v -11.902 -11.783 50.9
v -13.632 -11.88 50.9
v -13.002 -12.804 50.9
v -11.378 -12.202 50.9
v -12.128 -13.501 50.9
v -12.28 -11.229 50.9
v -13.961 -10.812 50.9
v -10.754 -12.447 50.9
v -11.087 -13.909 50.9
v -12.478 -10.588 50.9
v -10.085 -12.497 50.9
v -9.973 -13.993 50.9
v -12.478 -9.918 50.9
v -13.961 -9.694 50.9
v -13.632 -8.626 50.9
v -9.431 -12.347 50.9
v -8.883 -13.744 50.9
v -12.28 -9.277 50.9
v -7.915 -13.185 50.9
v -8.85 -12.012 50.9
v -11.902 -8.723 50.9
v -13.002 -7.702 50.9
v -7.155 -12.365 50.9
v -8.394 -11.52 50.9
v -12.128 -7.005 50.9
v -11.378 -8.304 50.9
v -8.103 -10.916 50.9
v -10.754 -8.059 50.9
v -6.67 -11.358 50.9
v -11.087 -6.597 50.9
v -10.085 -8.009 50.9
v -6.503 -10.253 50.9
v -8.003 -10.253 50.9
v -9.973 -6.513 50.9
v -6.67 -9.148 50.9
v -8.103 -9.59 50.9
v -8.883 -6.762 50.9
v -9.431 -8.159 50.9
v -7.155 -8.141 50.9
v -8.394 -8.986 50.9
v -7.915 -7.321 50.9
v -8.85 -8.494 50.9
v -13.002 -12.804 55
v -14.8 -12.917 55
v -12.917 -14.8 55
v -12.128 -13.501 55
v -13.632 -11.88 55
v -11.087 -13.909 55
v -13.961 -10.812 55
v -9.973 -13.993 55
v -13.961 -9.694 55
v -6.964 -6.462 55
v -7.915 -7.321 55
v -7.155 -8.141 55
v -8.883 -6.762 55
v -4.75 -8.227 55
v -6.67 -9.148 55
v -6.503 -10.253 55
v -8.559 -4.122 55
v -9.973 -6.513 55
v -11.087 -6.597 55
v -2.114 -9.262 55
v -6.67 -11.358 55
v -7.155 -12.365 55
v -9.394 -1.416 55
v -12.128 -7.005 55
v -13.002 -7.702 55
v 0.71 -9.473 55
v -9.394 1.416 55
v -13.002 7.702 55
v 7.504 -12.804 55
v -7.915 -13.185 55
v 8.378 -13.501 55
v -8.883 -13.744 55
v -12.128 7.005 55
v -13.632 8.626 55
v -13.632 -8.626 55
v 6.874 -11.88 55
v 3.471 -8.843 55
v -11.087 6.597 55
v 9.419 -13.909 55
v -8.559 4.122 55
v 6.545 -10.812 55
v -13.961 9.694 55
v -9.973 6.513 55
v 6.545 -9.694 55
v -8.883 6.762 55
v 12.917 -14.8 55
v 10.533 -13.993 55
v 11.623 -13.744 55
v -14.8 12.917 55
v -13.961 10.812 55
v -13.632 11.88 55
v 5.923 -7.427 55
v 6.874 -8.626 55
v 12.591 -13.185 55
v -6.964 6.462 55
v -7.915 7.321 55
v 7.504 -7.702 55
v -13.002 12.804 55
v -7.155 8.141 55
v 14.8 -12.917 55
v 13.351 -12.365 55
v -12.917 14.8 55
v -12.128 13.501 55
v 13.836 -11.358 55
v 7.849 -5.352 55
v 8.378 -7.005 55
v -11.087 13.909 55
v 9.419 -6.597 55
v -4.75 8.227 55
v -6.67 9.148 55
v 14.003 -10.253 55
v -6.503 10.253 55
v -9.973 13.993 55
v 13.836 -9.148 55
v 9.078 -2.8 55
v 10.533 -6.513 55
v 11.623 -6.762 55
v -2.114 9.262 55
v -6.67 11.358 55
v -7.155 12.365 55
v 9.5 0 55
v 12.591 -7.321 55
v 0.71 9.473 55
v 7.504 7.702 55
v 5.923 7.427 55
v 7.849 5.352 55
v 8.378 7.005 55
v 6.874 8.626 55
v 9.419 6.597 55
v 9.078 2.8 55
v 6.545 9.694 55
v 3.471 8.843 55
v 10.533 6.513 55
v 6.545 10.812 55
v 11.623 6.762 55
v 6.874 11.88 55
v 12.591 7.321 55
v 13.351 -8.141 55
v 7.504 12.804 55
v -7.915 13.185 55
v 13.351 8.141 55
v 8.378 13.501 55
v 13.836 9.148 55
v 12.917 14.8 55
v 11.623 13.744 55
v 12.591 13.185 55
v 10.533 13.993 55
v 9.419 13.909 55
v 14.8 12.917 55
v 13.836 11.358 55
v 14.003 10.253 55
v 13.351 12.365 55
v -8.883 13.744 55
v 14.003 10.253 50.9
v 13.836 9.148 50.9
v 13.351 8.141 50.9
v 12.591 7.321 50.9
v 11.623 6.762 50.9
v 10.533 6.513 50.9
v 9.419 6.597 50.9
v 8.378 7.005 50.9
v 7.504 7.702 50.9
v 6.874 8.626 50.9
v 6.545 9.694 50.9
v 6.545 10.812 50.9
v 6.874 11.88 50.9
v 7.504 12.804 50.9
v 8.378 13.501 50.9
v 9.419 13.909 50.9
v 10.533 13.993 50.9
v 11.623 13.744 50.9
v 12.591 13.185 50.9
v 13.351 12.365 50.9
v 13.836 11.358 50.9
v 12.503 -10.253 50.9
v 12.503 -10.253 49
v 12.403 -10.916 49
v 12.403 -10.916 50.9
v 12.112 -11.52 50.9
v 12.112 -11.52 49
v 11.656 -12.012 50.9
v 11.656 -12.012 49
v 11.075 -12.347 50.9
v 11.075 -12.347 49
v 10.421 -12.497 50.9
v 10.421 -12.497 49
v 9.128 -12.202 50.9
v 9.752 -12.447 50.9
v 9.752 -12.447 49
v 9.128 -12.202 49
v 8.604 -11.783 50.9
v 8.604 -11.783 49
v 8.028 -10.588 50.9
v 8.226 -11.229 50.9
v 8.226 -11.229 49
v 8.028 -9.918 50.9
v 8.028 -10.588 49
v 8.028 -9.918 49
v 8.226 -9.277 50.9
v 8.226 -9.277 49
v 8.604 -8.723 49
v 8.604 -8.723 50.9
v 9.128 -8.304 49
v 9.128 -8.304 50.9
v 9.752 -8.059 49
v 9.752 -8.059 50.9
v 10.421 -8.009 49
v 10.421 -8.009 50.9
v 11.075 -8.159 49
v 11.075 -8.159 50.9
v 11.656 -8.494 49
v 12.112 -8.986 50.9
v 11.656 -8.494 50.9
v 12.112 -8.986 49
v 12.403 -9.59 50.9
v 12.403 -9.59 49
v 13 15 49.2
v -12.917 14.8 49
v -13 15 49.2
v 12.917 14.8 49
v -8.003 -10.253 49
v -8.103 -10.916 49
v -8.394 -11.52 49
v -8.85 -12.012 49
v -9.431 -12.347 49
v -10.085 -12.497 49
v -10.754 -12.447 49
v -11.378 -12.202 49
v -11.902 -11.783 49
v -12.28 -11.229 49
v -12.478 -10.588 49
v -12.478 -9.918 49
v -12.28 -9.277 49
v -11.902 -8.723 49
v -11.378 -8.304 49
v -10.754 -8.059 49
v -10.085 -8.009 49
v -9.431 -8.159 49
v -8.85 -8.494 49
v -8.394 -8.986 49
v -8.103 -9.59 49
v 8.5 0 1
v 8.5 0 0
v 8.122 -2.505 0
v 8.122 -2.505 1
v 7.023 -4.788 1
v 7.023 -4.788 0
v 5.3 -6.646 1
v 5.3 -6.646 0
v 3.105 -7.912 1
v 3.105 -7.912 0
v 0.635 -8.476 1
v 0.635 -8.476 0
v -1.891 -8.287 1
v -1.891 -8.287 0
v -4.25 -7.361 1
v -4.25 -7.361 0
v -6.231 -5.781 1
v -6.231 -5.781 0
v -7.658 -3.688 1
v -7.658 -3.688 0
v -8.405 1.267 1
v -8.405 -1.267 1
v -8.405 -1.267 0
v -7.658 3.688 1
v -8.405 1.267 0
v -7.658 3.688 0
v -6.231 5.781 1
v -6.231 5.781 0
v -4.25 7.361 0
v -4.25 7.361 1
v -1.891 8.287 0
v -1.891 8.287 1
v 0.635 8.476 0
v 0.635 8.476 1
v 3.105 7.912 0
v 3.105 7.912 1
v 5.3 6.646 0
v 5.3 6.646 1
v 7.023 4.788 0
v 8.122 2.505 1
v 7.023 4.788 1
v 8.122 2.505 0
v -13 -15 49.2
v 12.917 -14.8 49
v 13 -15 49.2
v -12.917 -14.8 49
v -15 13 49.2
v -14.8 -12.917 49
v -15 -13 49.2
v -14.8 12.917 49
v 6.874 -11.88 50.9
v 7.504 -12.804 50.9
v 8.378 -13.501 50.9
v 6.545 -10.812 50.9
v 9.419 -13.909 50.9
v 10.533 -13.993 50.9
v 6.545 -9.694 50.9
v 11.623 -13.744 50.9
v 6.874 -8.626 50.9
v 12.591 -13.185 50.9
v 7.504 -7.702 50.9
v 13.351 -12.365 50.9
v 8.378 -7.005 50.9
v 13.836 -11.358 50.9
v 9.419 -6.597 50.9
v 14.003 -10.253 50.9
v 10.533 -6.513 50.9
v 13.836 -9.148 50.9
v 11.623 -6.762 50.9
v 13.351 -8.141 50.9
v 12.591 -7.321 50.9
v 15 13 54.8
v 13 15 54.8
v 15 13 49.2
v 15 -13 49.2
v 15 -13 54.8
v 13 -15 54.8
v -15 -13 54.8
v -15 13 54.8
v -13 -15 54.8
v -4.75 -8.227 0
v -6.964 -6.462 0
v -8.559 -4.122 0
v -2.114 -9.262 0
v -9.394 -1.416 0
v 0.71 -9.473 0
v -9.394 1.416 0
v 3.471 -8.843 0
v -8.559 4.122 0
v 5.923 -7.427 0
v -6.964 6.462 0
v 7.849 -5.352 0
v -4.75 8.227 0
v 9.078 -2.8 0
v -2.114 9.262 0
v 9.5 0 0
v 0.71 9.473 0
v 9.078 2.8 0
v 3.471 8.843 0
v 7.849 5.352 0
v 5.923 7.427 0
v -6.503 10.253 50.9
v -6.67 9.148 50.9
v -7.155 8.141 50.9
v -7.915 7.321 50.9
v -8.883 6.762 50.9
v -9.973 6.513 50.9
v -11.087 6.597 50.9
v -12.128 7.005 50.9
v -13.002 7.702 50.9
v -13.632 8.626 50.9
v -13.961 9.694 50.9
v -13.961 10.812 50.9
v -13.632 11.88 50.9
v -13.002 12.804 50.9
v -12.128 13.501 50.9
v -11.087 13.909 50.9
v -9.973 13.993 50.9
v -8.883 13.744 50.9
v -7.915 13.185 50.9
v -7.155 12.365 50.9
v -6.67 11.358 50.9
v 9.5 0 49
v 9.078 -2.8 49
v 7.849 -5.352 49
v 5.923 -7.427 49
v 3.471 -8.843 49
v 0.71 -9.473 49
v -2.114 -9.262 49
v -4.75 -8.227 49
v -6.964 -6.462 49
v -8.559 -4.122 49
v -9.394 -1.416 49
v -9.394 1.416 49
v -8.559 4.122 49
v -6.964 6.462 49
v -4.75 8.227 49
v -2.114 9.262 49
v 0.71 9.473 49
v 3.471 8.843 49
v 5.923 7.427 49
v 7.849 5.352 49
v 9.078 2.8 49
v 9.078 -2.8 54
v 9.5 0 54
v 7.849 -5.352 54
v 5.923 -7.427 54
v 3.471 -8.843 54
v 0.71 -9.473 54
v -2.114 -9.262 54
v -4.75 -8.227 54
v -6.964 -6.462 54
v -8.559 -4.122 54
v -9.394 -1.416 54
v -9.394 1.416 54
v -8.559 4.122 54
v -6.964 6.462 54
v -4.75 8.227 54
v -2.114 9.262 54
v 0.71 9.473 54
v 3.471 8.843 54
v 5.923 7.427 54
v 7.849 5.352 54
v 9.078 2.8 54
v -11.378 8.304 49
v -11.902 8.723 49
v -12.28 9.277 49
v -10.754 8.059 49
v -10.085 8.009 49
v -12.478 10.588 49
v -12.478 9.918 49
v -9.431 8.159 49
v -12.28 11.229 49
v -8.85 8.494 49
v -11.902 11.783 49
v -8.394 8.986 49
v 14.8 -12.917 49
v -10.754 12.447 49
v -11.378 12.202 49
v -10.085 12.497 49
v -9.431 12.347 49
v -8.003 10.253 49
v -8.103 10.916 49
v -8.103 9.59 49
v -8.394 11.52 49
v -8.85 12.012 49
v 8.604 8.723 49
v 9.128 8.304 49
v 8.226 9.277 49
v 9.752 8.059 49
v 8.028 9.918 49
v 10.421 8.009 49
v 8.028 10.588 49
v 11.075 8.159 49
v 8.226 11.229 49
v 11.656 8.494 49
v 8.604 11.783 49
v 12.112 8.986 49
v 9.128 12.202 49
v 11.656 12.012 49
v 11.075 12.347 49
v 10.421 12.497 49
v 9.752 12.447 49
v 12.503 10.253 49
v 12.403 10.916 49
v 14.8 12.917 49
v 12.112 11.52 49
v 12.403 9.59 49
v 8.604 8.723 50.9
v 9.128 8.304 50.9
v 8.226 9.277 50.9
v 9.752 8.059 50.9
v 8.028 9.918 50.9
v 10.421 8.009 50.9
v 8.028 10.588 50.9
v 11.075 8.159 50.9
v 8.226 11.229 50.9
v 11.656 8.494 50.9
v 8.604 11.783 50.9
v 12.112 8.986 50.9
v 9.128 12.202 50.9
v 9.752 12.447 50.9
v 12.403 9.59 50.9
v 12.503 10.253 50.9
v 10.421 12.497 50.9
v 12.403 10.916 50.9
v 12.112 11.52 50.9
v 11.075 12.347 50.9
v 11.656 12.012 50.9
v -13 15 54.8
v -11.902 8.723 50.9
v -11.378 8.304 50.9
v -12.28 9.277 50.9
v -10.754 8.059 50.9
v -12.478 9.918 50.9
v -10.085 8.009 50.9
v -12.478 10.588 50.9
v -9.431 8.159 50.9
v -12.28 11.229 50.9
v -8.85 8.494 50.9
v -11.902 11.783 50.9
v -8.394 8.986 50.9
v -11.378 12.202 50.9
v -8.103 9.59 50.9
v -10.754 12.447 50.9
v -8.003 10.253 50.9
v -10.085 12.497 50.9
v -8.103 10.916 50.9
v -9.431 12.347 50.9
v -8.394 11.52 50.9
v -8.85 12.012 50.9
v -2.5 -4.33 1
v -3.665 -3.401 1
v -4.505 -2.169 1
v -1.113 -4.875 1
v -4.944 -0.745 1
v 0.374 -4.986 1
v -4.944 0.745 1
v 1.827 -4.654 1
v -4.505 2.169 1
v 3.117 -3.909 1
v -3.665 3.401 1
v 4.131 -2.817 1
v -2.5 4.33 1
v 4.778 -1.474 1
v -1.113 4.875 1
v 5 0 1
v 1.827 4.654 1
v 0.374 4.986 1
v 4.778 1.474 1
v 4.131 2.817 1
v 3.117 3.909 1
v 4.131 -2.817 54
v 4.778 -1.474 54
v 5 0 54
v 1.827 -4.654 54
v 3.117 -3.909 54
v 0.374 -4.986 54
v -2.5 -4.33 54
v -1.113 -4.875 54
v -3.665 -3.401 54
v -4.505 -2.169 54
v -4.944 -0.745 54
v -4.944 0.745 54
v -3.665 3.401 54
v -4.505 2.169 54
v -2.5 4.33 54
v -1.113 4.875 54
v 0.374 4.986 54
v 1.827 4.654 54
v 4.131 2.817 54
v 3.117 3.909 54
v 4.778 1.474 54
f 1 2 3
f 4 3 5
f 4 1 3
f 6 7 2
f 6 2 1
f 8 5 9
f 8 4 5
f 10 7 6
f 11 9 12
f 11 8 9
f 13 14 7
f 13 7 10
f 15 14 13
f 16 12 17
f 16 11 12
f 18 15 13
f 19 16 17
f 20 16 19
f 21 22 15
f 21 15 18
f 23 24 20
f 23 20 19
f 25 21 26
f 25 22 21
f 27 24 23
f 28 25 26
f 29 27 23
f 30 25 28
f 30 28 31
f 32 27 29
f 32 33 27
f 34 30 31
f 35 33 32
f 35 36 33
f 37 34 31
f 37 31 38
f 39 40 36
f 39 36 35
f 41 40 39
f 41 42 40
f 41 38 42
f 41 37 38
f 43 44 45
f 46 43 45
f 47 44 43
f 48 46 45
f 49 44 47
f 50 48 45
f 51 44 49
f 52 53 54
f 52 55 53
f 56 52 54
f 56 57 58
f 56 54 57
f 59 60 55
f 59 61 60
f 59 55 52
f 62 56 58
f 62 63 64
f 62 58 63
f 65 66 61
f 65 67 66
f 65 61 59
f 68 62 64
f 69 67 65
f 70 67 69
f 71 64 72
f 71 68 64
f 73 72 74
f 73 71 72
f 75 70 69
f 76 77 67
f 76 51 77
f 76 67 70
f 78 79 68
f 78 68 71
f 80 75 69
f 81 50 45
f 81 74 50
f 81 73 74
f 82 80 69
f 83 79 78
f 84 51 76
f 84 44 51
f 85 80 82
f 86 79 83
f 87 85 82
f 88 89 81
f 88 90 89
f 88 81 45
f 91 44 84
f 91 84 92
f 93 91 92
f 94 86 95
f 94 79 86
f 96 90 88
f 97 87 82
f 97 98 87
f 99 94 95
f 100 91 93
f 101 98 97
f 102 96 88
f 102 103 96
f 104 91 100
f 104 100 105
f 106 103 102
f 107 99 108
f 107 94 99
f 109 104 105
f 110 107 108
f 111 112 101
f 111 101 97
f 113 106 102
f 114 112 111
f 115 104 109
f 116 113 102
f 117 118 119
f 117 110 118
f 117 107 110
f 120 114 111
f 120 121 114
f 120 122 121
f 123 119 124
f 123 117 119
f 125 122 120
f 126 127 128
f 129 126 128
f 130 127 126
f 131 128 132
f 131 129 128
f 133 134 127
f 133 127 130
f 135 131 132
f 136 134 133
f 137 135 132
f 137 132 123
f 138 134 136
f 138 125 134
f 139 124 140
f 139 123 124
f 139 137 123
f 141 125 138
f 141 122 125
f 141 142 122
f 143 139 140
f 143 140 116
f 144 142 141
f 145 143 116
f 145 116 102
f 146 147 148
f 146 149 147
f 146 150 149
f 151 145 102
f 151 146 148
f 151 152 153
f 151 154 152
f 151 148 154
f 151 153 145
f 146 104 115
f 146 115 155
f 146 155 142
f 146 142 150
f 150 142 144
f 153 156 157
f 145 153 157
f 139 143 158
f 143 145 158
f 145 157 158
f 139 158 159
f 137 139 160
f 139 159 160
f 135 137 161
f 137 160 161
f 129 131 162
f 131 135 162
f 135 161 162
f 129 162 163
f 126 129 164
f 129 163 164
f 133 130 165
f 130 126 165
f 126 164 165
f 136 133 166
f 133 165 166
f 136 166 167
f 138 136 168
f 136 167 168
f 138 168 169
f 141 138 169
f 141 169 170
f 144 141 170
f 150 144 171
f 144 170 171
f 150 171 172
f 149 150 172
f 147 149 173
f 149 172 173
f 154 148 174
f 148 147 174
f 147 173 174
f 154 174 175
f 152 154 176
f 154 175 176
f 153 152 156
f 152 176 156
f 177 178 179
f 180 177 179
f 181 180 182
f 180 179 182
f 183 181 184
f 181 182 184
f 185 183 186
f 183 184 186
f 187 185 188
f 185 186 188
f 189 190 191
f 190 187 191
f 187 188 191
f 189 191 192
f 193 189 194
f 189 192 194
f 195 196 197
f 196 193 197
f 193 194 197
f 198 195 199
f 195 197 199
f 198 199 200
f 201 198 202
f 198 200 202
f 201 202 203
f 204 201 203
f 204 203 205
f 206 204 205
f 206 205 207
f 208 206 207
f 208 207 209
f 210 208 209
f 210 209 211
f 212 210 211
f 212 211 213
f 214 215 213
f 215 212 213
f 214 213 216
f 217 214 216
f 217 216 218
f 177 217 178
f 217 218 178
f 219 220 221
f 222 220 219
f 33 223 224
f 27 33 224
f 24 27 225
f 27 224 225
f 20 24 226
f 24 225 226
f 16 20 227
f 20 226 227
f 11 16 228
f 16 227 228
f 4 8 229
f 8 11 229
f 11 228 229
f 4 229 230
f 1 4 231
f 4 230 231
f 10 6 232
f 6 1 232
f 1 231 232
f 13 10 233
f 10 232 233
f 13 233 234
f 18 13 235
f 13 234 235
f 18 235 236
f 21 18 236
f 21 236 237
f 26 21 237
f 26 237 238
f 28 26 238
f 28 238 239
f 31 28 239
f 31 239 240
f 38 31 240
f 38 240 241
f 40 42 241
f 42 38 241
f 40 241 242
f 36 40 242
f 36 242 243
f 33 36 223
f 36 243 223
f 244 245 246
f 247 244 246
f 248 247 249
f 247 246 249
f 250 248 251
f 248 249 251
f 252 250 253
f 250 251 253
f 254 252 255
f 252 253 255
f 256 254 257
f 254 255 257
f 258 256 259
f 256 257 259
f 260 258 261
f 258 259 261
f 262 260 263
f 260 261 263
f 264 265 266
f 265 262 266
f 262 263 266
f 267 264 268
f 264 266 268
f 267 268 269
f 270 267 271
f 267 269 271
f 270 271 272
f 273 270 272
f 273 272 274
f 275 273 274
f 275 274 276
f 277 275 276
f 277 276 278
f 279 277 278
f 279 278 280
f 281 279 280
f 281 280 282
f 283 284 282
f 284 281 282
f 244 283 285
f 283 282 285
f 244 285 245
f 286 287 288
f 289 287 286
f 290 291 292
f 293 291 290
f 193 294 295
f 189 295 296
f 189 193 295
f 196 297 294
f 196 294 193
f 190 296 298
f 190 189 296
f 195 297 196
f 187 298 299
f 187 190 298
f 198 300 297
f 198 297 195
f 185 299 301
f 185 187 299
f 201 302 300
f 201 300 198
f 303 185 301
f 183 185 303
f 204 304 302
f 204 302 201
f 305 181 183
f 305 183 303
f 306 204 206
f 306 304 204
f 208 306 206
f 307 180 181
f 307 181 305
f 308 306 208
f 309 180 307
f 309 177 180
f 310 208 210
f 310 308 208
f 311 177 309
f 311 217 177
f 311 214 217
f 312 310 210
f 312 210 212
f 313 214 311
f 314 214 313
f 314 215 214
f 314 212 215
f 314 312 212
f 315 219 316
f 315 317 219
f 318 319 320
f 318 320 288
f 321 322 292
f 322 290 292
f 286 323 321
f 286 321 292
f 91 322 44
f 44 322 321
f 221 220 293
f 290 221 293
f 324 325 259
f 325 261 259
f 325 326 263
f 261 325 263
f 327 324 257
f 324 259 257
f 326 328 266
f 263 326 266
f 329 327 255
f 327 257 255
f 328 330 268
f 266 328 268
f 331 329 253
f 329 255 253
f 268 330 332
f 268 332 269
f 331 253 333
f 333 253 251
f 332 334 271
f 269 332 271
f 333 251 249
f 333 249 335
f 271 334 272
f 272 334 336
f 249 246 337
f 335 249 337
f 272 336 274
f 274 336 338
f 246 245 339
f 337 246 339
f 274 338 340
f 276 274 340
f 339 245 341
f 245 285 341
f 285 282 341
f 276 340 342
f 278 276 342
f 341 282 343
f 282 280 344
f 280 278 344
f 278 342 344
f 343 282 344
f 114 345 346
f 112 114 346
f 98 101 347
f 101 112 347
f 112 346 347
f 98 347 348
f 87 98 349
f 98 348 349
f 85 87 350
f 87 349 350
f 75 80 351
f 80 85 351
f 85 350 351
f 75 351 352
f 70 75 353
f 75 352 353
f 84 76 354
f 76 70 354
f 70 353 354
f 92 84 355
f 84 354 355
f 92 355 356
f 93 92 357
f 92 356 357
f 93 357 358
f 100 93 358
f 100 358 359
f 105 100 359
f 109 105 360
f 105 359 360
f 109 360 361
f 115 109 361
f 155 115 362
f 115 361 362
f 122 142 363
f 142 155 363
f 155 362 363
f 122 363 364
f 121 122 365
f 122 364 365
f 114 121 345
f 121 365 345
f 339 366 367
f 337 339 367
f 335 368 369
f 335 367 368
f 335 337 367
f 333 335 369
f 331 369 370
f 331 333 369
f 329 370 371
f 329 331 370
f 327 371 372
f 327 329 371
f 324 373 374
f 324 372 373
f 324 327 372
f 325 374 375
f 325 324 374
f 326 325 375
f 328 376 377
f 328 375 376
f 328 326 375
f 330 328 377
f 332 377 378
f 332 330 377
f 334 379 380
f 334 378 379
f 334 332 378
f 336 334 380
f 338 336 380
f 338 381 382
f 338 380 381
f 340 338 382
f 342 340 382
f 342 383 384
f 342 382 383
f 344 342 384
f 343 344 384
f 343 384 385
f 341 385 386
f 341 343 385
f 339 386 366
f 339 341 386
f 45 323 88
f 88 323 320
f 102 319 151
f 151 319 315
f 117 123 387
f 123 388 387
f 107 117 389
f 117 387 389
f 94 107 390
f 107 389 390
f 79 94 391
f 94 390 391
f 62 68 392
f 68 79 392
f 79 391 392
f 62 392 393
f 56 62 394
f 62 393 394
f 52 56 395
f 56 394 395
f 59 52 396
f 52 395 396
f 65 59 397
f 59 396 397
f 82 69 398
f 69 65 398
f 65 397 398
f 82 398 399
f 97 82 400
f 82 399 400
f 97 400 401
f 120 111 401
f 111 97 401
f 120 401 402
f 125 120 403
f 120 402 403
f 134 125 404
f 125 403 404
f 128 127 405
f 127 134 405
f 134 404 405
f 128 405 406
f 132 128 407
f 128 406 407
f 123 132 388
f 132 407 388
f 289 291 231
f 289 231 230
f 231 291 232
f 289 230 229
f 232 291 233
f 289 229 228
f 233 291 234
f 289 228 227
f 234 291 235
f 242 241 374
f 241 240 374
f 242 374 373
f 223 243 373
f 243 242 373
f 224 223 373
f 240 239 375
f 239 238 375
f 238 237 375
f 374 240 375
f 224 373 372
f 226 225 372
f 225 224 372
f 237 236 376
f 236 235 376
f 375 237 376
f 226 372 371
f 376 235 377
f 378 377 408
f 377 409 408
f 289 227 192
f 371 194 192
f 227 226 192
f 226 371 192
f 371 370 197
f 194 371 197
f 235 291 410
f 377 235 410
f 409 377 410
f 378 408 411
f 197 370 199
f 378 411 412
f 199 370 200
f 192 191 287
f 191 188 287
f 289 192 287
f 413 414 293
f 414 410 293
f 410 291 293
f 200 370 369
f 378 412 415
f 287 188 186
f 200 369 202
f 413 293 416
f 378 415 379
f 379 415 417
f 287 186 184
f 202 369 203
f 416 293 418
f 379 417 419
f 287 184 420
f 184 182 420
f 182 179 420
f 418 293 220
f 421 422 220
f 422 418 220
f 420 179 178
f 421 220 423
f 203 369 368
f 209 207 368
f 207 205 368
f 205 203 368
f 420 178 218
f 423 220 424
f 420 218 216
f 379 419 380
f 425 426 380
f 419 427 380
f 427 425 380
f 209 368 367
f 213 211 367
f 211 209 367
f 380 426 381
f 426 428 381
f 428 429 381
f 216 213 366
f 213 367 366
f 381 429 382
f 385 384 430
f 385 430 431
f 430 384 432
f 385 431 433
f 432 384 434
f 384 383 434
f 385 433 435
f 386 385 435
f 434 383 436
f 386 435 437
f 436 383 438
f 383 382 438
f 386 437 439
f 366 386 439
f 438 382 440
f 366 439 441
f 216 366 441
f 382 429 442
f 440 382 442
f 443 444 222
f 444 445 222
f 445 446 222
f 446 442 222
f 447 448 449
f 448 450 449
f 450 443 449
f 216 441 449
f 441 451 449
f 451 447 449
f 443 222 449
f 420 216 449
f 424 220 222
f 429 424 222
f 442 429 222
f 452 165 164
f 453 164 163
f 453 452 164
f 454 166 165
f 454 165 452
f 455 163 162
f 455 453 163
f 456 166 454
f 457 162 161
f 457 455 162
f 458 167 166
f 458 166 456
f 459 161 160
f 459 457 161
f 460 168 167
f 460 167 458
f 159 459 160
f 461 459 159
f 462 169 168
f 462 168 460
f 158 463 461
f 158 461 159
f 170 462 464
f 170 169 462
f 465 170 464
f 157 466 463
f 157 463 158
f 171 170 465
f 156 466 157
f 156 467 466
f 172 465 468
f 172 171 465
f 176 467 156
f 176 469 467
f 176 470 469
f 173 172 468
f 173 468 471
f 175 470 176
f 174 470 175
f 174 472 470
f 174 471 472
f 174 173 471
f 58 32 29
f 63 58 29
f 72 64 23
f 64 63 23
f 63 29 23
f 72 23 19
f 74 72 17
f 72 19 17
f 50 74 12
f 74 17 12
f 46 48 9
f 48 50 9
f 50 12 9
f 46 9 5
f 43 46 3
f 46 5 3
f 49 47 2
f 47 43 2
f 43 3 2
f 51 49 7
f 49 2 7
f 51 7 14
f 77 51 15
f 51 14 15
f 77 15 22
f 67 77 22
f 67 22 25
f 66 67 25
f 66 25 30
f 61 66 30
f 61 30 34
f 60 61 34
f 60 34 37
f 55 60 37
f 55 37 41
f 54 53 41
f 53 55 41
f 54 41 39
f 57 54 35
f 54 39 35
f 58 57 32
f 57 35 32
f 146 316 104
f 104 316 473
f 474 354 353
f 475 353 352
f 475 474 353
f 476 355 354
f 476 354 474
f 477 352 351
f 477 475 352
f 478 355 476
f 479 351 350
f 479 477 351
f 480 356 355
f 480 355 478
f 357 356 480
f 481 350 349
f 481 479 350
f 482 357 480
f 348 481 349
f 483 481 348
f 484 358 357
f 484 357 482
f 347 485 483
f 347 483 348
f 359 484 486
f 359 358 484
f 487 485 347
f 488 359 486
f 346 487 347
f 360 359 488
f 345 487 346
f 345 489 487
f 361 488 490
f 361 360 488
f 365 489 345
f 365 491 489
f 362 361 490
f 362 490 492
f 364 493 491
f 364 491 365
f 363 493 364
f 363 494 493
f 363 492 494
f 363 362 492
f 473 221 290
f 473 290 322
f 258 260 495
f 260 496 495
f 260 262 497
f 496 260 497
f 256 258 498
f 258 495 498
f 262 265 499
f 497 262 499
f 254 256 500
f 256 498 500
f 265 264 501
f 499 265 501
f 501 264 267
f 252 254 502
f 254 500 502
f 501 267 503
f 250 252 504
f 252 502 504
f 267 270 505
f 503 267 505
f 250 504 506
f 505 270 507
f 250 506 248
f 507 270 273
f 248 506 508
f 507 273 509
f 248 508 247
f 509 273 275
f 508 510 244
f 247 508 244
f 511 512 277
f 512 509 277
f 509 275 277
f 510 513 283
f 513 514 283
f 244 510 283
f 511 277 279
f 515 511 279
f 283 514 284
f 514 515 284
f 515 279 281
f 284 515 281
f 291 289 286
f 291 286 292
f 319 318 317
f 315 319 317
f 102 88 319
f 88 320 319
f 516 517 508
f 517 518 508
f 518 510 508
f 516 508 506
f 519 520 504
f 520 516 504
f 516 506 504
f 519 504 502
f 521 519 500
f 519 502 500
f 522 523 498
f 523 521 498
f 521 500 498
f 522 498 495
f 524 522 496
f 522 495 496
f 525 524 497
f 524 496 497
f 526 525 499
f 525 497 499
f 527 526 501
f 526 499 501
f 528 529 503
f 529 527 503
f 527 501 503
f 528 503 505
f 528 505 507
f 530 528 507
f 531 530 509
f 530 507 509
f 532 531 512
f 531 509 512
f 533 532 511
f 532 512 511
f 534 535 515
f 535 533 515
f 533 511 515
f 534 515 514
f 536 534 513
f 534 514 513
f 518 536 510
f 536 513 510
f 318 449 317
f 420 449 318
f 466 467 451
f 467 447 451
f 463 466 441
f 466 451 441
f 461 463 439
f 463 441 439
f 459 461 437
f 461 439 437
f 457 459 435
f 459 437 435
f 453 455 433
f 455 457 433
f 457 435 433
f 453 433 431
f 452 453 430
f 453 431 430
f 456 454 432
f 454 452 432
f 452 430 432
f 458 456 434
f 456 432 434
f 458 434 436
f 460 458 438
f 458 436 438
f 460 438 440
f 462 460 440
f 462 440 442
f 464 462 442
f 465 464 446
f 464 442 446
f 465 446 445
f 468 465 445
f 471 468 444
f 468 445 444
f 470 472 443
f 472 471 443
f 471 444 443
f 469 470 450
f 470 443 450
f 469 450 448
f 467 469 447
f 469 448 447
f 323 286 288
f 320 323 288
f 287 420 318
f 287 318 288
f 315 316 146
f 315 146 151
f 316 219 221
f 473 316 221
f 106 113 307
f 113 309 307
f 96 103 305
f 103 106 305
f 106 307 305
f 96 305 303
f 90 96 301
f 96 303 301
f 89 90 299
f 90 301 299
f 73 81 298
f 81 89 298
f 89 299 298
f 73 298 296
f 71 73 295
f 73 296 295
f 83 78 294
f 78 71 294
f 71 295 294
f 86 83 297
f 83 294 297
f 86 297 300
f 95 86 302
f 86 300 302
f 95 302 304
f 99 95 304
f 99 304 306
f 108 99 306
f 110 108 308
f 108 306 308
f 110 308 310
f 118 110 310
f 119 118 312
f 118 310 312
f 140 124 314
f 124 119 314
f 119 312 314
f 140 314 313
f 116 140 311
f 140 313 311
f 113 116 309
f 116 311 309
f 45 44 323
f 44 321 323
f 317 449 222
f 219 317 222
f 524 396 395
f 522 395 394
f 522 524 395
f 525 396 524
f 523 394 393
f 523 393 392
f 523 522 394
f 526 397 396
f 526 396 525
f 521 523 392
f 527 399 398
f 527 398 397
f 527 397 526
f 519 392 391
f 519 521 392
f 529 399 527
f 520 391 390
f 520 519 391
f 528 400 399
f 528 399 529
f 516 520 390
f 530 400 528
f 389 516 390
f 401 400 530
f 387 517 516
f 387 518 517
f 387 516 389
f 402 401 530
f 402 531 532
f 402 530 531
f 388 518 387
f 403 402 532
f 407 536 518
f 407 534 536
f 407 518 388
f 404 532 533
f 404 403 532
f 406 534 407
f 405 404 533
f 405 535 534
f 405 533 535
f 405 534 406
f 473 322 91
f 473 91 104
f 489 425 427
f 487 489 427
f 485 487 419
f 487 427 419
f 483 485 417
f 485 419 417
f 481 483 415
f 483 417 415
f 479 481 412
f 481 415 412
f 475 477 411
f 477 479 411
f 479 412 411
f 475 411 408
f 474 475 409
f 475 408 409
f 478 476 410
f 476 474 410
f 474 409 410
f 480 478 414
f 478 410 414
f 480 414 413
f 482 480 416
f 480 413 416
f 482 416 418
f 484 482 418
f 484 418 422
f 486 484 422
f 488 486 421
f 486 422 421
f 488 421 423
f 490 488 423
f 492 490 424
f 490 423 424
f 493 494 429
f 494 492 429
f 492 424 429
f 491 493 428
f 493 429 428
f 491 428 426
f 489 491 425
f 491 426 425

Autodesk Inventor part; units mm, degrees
ref_plane "YZ Plane" through (0, 0, 0) normal (1, 0, 0) x (0, 1, 0)
ref_plane "XZ Plane" through (0, 0, 0) normal (0, 1, 0) x (-1, 0, 0)
sketch "Sketch1" plane through (0, 0, 0) normal (0, 0, 1) x (1, 0, 0)
  circle A0 centre (0, 0) radius 5
  circle A1 centre (0, 0) radius 9.5
  circle A2 centre (0, 0) radius 8.5
  dimension "d" = 10
  dimension "D" = 19
  dimension "d23" = 17
extrude "Extrusion1" add sketch "Sketch1" along normal blind 49 contours A1 | A2
sketch "Sketch2" plane through (0, 0, 49) normal (0, 0, 1) x (1, 0, 0)
  circle A0 centre (0, 0) radius 9.5
  line L0 (-15, -15) -> (15, -15)
  line L1 (15, -15) -> (15, 15)
  line L2 (15, 15) -> (-15, 15)
  line L3 (-15, 15) -> (-15, -15)
  line L4 (-15, -15) -> (15, 15) construction
  line L5 (15, -15) -> (-15, 15) construction
  circle A1 centre (0, 0) radius 14.5 construction
  circle A2 centre (10.253, 10.253) radius 2.25
  circle A3 centre (10.253, 10.253) radius 3.75
  line L6 (-5.4596, 0) -> (5.4596, 0) construction
  line L7 (0, -5.5798) -> (0, 5.5798) construction
  circle A4 centre (10.253, -10.253) radius 2.25
  circle A5 centre (10.253, -10.253) radius 3.75
  circle A6 centre (-10.253, 10.253) radius 2.25
  circle A7 centre (-10.253, 10.253) radius 3.75
  circle A8 centre (-10.253, -10.253) radius 3.75
  circle A9 centre (-10.253, -10.253) radius 2.25
  circle A10 centre (0, 0) radius 5
  point P0 (15, 0)
  point P1 (0, 15)
  point P2 (0, 0)
  point P3 (0, 0)
  dimension "DP" = 29
  dimension "k" = 30
  dimension "d27" = 30
  dimension "X" = 4.5
  dimension "Y" = 7.5
ref_plane "Work Plane1" through (0, 0, 55) normal (0, 0, 1) x (1, 0, 0)
extrude "Extrusion6" cut sketch "Sketch1" along normal blind 1 contours A2
extrude "Extrusion7" add sketch "Sketch2" along normal blind 6 contours L3 L2 L1 L0
chamfer "Chamfer1" distance 2 angle 45 4 edges at (-15, -15, 52) (15, -15, 52) (15, 15, 52) (-15, 15, 52)
extrude "Extrusion8" add sketch "Sketch2" along normal blind 1.9 contours A3 | A5 | A7 | A8
extrude "Extrusion9" add sketch "Sketch2" along normal blind 5 contours A0
chamfer "Chamfer2" distance 0.2 angle 45 16 edges at (0, -15, 55) (-15, 0, 55) (0, 15, 55) (15, 0, 55) (14, -14, 55) (-14, -14, 55) (-14, 14, 55) (14, 14, 55) (-14, -14, 49) (0, -15, 49) (-15, 0, 49) (14, -14, 49) (15, 0, 49) (14, 14, 49) (0, 15, 49) (-14, 14, 49)
equation "\"d27\" = k"
equation "\"d36\" = t - z"
equation "\"z\" = 4.1"
equation "\"t\" = 6"
properties part number "RolamentoLinear10d"
